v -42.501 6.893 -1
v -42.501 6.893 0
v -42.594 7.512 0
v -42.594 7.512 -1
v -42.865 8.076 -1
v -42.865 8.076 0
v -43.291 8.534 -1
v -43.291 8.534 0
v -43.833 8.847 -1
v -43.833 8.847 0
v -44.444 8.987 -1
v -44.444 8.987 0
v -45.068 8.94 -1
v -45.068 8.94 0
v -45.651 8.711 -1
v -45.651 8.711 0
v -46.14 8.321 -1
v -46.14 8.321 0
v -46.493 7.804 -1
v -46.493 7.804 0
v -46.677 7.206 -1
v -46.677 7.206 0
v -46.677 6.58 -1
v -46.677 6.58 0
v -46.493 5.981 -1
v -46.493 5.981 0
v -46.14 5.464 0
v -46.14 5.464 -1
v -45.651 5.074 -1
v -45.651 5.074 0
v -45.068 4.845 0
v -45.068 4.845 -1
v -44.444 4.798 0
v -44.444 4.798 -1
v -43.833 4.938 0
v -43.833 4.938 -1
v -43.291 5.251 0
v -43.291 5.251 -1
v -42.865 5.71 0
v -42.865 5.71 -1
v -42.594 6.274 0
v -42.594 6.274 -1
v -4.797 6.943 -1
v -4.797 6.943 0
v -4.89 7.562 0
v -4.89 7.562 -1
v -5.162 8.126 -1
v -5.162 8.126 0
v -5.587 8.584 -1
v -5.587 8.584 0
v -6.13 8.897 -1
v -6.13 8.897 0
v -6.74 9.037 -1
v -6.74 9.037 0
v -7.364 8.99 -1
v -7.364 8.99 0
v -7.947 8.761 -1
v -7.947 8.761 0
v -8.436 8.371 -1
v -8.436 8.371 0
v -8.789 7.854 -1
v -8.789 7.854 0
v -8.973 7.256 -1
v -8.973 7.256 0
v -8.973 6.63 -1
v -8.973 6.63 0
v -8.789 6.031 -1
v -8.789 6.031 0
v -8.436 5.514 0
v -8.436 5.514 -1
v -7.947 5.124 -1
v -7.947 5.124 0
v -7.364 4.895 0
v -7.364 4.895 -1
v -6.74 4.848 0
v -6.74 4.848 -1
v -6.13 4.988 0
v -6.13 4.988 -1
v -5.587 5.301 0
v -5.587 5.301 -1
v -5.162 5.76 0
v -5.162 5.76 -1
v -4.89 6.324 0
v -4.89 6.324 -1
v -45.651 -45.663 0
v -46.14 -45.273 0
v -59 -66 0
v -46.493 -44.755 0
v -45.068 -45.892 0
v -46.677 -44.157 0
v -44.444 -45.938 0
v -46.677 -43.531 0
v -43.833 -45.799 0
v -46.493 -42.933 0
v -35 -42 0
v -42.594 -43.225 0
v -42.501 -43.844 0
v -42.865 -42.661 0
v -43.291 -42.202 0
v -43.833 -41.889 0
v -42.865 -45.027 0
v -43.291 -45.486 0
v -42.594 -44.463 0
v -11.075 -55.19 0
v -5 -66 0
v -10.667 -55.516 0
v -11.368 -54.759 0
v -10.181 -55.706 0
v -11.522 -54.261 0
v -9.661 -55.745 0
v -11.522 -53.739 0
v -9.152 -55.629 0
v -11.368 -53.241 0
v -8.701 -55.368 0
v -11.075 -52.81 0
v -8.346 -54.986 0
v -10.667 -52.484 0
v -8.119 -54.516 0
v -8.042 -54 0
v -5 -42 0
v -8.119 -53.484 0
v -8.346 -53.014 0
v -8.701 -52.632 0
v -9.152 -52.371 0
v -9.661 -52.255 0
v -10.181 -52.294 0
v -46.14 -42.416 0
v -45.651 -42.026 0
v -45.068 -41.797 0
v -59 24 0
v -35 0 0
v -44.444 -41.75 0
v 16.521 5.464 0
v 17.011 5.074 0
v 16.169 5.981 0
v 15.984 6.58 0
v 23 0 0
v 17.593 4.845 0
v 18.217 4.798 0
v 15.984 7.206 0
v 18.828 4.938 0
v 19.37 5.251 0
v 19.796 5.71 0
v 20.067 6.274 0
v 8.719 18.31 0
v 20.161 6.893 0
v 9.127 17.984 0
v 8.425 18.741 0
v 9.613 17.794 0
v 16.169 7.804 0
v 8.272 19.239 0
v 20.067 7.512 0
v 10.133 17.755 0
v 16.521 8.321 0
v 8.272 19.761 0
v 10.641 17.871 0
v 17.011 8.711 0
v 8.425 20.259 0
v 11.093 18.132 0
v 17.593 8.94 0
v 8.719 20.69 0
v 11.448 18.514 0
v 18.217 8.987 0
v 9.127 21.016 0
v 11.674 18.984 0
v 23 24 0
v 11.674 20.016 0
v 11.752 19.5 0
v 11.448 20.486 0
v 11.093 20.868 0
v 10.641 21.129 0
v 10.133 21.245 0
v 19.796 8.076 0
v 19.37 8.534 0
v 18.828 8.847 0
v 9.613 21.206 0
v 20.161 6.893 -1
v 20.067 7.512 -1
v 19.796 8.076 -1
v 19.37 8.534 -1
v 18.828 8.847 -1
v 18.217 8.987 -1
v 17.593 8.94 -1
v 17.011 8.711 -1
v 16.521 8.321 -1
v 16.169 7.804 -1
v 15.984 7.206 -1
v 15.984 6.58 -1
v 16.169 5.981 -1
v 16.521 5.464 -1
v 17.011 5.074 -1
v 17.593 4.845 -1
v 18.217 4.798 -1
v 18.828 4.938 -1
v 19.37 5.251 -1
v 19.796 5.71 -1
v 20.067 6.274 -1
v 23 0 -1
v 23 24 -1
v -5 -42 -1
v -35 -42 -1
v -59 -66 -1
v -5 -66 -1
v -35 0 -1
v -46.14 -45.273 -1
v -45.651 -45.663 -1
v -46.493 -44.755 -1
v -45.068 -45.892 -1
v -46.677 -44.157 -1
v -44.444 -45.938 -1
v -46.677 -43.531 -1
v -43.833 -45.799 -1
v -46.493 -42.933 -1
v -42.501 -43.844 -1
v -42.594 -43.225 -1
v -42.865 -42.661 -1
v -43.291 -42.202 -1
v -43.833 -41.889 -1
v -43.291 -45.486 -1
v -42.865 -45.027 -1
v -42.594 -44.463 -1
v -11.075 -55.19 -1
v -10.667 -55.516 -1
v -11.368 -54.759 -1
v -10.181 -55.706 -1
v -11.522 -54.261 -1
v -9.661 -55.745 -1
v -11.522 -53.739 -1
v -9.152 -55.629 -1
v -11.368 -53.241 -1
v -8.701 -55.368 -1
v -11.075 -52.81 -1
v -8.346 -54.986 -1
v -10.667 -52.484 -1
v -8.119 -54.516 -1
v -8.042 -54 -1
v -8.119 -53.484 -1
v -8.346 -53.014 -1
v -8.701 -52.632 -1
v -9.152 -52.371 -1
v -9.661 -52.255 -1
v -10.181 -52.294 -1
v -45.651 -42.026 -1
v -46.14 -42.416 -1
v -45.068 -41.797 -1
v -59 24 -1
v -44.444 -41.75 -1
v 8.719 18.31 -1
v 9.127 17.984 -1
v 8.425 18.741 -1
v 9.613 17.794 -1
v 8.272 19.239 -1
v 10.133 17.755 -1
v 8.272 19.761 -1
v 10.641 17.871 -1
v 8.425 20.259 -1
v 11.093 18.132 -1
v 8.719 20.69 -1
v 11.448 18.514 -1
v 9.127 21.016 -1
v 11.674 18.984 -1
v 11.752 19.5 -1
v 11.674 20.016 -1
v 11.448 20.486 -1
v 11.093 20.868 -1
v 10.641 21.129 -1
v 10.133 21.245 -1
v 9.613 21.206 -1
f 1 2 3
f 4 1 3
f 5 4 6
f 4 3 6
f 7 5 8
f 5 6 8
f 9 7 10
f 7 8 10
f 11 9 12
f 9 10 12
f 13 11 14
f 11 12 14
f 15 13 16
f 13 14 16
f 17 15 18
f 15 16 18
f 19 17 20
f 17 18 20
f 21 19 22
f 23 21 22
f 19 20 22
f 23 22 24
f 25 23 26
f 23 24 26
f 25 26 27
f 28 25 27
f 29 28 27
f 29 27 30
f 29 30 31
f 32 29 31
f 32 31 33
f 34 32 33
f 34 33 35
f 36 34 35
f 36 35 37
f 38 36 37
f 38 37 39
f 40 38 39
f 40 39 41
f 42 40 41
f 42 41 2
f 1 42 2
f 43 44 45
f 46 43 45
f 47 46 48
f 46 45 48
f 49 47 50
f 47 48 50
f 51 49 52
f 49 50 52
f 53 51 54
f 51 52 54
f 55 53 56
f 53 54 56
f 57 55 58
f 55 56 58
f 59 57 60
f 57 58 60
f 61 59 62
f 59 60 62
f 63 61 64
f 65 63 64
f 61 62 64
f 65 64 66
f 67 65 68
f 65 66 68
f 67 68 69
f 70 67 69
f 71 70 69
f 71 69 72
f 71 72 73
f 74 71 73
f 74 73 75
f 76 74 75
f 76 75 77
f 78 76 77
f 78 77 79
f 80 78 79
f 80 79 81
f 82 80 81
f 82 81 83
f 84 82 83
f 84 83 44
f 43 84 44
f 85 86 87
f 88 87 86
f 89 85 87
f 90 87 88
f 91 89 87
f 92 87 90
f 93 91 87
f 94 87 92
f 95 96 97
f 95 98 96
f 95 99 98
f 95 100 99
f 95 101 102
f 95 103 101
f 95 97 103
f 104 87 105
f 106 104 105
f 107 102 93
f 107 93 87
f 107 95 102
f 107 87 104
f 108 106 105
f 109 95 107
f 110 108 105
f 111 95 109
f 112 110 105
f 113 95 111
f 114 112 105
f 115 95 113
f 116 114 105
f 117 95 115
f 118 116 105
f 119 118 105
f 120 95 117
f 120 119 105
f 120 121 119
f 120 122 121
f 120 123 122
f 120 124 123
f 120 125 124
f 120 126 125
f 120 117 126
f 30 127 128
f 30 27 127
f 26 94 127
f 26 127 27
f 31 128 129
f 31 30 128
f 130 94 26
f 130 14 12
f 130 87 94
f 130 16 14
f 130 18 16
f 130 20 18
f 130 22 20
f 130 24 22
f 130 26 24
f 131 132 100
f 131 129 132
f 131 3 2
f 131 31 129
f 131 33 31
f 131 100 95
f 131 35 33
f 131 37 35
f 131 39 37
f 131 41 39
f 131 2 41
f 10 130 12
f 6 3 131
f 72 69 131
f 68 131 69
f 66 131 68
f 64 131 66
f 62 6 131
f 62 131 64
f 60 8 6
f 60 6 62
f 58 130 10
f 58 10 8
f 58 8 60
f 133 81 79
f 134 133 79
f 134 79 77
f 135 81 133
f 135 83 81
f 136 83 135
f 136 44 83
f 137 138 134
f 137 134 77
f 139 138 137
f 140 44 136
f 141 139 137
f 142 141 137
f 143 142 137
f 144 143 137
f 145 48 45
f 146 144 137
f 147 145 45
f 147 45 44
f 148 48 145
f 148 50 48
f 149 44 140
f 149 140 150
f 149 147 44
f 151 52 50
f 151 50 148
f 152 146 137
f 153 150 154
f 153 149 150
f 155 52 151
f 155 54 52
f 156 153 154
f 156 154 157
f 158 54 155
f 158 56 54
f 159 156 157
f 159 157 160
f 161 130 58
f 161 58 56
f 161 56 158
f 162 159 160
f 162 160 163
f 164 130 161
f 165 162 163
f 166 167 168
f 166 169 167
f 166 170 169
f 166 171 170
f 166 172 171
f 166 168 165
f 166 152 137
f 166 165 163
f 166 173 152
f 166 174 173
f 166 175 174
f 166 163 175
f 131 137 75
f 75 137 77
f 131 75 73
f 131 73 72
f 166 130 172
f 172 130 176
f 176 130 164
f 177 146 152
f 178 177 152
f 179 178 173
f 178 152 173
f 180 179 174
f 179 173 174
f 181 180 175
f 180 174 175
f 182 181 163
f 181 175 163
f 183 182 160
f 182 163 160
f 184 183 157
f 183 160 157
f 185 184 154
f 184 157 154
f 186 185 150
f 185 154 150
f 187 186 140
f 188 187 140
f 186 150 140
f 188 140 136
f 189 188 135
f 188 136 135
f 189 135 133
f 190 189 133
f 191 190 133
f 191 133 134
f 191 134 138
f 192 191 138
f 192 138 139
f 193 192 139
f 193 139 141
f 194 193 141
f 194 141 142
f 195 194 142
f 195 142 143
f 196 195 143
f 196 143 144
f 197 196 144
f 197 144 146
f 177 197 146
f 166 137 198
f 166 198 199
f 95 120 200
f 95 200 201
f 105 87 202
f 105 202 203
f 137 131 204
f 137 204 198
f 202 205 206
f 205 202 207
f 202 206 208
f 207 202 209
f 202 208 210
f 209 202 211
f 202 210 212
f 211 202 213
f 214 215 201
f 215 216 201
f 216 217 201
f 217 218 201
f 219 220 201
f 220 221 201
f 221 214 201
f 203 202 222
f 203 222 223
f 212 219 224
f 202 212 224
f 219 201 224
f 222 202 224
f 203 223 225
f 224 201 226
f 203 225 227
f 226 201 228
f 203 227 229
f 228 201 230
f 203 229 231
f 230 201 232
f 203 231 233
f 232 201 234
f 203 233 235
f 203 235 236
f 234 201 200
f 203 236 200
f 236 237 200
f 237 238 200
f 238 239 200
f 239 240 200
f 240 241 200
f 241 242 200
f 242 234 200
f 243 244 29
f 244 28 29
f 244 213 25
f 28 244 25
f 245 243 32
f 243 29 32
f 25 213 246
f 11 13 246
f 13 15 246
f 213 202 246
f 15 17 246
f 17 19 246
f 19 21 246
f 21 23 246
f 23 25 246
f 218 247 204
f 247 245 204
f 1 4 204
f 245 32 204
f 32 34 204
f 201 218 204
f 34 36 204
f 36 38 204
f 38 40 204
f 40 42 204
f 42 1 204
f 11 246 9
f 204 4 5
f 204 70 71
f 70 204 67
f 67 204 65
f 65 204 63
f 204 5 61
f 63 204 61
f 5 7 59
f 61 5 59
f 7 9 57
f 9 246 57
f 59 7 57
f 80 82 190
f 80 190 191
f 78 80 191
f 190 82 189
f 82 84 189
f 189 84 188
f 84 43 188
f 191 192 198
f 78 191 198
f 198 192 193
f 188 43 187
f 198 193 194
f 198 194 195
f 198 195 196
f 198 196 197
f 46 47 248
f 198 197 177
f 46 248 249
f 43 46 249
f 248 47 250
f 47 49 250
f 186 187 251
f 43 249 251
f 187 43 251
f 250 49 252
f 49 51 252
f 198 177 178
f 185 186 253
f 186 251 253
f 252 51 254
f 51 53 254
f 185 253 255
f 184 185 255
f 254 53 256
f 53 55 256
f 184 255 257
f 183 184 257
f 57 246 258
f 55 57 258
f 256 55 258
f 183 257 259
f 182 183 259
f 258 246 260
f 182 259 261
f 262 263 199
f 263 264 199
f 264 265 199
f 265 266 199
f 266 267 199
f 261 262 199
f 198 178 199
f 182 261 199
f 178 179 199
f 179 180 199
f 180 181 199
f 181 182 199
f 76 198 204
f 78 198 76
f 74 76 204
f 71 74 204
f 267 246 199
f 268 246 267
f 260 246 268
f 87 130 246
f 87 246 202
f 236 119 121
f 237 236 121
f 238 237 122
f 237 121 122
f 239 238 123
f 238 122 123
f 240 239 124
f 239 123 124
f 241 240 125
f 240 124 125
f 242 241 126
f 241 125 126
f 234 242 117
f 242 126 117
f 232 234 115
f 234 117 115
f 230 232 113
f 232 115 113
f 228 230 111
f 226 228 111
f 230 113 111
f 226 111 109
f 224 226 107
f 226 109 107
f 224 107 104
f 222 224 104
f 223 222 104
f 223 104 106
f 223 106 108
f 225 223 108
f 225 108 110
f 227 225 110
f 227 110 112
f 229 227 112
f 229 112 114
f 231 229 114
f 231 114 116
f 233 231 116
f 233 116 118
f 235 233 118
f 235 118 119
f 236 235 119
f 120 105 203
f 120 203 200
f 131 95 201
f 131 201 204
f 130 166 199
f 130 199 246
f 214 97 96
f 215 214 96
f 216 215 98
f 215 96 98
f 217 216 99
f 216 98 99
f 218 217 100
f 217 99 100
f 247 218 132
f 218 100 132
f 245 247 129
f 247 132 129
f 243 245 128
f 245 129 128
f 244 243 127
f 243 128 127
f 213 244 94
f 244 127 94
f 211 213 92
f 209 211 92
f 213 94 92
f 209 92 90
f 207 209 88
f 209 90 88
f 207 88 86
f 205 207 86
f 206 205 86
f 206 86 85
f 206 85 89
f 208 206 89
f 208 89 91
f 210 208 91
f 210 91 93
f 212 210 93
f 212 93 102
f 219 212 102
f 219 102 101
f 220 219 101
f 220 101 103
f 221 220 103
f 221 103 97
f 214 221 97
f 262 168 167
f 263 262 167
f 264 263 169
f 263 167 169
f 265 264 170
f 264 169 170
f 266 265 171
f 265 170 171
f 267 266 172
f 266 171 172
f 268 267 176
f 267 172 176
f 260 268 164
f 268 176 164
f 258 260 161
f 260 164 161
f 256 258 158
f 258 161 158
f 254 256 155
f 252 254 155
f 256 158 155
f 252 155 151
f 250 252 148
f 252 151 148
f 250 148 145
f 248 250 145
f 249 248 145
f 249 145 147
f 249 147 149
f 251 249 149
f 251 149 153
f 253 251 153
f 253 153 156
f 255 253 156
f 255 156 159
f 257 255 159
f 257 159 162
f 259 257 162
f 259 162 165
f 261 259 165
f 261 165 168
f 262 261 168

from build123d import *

# Parameters (mm, degrees)
BASE_FLANGE1_DEPTH = 1
SKETCH3_R          = 2.1
SKETCH3_R_2        = 1.75
CUT_EXTRUDE1_DEPTH = 40
SKETCH4_R          = 1.75
CUT_EXTRUDE2_DEPTH = 10


# Sheet-metal steps are written as plain solids
with BuildPart() as part:
    # Sketch1 → Base-Flange1 (new body)
    with BuildSketch(Plane.XY):
        Polygon((0, 24), (-59, 24), (-59, -66), (-35, -66), (-5, -66), (-5, -42), (-35, -42), (-35, 0), (23, 0), (23, 24), align=None)
    extrude(amount=-BASE_FLANGE1_DEPTH)

    # Sketch3 → Cut-Extrude1 (cut)
    with BuildSketch(Plane.XY):
        with Locations((-44.600589414, -43.844308668)):
            Circle(SKETCH3_R)
        with Locations((-44.600589414, 6.892572586)):
            Circle(SKETCH3_R)
        with Locations((-6.896760866, 6.942572586)):
            Circle(SKETCH3_R)
        with Locations((18.060540453, 6.892572586)):
            Circle(SKETCH3_R)
        with Locations((10.002152137, 19.5)):
            Circle(SKETCH3_R_2)
    extrude(amount=-CUT_EXTRUDE1_DEPTH, mode=Mode.SUBTRACT)

    # Sketch4 → Cut-Extrude2 (cut)
    with BuildSketch(Plane.XY):
        with Locations((-9.791680506, -54)):
            Circle(SKETCH4_R)
    extrude(amount=-CUT_EXTRUDE2_DEPTH, mode=Mode.SUBTRACT)


solid = part.part
